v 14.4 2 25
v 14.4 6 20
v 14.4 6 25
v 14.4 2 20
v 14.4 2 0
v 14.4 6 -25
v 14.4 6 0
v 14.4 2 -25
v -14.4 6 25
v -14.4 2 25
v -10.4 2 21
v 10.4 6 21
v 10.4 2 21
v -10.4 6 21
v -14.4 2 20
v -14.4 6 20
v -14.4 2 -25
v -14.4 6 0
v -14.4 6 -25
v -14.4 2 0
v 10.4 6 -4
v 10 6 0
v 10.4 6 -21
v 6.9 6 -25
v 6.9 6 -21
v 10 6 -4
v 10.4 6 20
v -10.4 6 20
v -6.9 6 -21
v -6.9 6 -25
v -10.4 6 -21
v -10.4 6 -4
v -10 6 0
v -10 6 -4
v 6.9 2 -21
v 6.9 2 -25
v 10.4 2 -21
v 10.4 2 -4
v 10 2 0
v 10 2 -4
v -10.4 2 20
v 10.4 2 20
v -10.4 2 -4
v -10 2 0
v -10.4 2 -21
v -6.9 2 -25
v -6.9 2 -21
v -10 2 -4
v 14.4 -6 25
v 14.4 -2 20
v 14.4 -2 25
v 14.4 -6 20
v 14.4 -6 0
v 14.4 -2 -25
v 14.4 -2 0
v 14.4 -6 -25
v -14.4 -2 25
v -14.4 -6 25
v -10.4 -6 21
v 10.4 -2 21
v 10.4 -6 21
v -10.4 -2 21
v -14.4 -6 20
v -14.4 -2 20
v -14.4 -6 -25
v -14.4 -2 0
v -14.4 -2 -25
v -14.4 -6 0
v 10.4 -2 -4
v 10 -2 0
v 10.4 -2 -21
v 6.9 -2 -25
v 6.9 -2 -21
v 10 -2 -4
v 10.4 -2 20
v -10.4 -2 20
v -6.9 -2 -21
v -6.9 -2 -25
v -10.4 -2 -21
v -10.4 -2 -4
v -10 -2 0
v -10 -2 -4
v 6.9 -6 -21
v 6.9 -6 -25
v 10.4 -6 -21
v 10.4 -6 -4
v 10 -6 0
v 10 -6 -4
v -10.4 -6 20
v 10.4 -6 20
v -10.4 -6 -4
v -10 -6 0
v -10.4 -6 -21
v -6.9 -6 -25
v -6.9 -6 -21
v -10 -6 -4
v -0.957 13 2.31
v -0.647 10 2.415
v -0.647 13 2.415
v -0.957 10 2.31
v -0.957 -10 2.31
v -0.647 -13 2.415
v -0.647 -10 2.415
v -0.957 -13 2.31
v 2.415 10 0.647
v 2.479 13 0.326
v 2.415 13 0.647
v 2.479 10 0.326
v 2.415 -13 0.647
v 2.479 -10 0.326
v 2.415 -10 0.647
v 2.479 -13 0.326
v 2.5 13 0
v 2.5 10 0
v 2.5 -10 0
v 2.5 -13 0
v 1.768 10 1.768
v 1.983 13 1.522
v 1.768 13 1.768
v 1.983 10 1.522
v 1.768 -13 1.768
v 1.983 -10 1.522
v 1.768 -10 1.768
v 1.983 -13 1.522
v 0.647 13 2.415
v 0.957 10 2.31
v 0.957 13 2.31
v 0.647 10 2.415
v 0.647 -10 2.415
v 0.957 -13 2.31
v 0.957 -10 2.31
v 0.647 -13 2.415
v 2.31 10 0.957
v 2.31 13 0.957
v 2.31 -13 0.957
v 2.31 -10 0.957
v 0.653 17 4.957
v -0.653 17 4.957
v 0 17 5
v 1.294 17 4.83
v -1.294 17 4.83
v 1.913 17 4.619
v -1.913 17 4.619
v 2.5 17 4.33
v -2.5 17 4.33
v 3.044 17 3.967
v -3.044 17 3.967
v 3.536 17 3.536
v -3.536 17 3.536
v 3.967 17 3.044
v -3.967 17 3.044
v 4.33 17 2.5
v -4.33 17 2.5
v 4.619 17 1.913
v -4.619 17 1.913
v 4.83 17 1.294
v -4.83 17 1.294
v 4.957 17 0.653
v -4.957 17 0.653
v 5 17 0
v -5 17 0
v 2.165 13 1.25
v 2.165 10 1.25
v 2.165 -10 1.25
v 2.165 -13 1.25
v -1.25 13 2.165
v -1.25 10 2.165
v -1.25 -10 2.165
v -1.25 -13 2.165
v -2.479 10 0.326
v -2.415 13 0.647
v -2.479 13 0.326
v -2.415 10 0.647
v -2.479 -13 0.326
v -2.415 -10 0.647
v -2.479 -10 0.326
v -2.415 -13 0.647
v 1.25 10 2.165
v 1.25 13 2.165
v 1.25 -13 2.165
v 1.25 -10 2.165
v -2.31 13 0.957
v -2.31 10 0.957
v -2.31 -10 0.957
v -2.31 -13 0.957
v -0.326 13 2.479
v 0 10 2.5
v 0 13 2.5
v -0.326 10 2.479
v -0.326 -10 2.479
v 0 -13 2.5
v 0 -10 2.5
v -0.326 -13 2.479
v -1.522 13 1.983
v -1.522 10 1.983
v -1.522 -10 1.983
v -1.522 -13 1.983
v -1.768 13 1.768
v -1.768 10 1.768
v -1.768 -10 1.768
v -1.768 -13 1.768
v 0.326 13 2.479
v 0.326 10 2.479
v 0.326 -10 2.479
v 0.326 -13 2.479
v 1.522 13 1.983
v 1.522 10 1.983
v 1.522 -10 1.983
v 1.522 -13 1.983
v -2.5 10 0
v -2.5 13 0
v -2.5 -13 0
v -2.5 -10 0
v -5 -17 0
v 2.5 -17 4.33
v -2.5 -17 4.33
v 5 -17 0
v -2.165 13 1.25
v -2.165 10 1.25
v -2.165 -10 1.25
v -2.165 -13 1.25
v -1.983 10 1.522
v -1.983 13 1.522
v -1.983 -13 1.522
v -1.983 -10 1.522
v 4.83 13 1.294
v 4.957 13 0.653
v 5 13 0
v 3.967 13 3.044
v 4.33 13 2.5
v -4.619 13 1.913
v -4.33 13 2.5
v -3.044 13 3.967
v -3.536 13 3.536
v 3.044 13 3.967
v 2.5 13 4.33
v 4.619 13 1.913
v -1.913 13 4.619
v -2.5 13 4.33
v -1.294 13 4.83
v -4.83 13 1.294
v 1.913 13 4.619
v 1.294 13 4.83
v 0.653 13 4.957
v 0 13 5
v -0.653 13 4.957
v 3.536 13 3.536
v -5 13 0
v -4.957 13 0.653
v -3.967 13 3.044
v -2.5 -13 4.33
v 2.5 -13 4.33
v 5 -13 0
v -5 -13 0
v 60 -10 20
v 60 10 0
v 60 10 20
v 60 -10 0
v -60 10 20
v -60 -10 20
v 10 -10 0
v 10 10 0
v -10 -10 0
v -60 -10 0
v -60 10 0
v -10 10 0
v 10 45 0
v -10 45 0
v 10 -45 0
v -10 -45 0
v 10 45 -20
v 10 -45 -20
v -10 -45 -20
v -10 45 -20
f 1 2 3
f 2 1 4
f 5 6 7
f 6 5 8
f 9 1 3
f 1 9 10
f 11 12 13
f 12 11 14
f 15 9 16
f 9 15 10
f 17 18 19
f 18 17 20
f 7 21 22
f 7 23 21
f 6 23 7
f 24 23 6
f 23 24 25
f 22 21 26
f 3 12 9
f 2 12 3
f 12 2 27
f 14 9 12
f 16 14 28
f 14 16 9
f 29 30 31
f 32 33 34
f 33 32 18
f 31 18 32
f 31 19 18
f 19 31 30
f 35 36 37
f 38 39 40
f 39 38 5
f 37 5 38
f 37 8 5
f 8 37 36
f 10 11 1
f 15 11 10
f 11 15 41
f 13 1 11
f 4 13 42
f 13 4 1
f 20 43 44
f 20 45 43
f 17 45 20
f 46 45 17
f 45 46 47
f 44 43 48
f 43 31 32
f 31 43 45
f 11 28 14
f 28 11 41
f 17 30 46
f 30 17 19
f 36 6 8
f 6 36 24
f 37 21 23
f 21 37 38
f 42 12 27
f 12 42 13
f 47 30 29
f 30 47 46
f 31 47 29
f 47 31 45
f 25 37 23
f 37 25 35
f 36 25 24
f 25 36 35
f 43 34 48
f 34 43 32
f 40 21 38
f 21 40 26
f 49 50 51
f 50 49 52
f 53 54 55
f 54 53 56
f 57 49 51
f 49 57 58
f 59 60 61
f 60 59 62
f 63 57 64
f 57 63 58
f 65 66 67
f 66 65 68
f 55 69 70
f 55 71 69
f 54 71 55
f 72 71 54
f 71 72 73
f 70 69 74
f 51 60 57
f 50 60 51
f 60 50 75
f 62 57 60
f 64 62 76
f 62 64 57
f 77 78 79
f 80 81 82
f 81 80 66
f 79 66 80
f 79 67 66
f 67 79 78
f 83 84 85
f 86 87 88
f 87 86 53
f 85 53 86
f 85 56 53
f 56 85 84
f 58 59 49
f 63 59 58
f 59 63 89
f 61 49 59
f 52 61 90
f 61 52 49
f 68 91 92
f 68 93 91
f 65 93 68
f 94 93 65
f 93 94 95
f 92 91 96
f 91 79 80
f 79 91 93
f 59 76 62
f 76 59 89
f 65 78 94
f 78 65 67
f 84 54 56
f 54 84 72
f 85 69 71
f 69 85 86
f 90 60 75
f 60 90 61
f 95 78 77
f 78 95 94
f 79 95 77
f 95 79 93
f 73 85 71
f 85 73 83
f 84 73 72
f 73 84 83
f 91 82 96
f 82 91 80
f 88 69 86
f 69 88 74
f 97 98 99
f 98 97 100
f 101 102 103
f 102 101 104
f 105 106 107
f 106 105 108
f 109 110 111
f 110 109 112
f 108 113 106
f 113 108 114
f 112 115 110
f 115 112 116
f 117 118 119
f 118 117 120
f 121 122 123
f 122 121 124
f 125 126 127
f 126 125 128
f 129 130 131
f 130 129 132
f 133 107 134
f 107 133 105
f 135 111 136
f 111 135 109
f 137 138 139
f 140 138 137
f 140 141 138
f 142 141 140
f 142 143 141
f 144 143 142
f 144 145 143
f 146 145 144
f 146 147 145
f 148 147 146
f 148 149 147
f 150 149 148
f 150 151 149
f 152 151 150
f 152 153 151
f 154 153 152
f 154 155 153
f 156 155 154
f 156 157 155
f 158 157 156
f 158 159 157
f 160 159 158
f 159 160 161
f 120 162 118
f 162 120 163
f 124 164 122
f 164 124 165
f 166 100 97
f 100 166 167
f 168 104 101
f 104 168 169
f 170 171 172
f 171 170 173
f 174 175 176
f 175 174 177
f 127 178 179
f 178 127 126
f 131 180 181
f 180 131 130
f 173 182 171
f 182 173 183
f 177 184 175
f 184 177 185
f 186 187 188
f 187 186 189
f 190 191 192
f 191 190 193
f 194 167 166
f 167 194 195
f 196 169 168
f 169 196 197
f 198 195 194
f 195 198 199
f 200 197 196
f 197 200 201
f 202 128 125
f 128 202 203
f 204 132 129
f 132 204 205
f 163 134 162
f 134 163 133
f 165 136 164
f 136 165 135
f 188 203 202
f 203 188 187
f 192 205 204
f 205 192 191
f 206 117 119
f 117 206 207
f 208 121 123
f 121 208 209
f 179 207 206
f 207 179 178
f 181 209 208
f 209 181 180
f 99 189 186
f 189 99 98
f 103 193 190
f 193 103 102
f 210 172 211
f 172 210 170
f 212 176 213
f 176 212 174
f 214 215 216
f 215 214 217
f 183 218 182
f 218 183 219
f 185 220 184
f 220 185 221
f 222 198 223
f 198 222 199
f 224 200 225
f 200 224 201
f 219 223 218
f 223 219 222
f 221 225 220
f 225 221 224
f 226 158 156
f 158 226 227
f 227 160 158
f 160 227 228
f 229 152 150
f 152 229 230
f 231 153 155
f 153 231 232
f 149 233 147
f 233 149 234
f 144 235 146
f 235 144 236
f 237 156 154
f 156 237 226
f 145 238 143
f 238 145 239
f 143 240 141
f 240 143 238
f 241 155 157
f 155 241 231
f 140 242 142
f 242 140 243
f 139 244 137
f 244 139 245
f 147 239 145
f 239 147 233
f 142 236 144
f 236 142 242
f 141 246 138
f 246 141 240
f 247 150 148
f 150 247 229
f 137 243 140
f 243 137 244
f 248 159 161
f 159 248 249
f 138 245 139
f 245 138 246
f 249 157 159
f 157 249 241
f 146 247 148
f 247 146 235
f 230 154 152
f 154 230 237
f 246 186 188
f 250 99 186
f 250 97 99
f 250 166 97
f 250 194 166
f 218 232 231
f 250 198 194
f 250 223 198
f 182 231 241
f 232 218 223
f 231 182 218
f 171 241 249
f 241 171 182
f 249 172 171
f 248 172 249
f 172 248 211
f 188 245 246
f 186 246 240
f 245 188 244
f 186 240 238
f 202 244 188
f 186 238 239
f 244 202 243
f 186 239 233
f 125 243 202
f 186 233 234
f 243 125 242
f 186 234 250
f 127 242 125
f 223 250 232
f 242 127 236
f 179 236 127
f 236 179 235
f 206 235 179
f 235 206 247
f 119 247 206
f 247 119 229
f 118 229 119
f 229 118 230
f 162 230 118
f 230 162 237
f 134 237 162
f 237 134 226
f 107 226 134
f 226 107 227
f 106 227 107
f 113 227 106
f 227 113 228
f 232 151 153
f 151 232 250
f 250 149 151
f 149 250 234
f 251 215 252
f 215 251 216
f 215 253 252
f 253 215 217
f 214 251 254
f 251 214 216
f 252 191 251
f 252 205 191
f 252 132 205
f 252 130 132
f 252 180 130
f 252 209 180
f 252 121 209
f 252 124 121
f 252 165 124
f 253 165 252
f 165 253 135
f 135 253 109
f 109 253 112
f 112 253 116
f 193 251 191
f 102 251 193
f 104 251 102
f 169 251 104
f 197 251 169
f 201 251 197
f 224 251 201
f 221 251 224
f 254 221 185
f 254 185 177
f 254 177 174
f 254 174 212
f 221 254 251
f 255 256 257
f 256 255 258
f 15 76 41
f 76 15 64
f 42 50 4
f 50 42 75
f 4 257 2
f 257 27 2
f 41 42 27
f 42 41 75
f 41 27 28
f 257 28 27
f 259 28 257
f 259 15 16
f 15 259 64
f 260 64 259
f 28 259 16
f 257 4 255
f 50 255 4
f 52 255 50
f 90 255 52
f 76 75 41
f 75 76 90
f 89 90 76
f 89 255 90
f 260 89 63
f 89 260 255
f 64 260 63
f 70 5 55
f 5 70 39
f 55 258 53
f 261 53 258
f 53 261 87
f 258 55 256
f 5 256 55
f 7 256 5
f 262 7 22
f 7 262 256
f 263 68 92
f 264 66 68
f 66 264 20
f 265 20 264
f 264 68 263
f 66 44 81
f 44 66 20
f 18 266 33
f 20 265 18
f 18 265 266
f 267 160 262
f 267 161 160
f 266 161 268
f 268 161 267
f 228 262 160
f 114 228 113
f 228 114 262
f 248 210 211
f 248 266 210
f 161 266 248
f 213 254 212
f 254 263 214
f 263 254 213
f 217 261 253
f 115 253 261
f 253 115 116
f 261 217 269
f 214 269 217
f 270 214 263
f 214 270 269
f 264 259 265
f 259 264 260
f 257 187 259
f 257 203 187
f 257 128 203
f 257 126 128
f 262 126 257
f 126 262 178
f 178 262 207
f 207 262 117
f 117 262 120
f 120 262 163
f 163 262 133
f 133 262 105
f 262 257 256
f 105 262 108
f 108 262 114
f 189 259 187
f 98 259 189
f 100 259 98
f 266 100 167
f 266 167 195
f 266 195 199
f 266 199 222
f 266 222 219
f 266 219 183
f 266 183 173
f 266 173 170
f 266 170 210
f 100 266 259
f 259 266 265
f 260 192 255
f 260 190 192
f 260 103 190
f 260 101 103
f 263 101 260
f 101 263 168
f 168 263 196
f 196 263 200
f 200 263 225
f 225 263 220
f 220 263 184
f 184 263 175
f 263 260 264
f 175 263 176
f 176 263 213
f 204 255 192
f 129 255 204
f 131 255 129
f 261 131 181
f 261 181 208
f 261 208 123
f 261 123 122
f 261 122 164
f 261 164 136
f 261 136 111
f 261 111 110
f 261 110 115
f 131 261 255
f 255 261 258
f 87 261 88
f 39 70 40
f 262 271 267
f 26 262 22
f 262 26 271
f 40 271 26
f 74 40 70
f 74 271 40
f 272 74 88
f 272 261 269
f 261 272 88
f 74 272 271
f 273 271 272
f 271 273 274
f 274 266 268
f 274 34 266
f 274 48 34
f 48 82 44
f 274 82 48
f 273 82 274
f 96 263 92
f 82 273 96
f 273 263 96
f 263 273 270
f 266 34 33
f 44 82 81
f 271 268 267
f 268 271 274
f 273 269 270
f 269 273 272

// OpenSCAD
// Pingpang-SmartGear — perpendicular 20x20 tube joint guard, v0.2
//
// Coordinate contract for this prototype:
//   x = barrier long direction
//   y = front/back direction
//   z = vertical direction
//
// The two context tubes are 20x20 and touch at z=0:
//   upper long tube: axis x, centre z=+10
//   lower cross tube: axis y, centre z=-10
//
// The printable parts are two separate U clips.  Their main U bodies sit on
// opposite y faces.  A male annular lap on the front clip enters a female
// annular socket on the back clip; the common screw clearance is on the y
// axis.  This is intentionally parameterized because the actual tube hole
// centre and the real M4/M5 hardware have not yet been measured.

$fn = 48;

PART = "joint_assembly";

// ---------- interface parameters ----------
tube = 20;
tube_clearance = 0.8;
u_inner_width = tube + tube_clearance;
wall = 4.0;
u_outer_width = u_inner_width + 2 * wall;

// The U is open toward the bottom and has small inward lips to retain the
// lower tube after the clip is placed over the joint.
u_bottom = -25;
u_top = 25;
hook_depth = 3.5;

// Front/back face plates.  Positive y is the front face.
plate_depth = 4.0;
front_y0 = 2.0;
front_y1 = front_y0 + plate_depth;
back_y0 = -front_y1;
back_y1 = -front_y0;

// Central lap: front male ring enters the back female socket.
male_lap_depth = 5.0;
male_od = 14.4;
female_od = 20.0;
female_id = 15.2;

// Central screw relief.  This is a clearance hole, not a printed thread.
screw_clearance_d = 6.2;
screw_counterbore_d = 10.8;
screw_counterbore_depth = 2.2;

// The central web joins the collar to both U arms and leaves a clear hole
// in the middle of the two-clips connection.
web_height = 8.0;
web_depth = plate_depth;

// ---------- small geometry helpers ----------
module box_at(xc, yc, zc, sx, sy, sz) {
    translate([xc, yc, zc]) cube([sx, sy, sz], center = true);
}

module annular_y(yc, length, outer_d, inner_d) {
    translate([0, yc, 0])
        difference() {
            rotate([90, 0, 0]) cylinder(d = outer_d, h = length, center = true);
            rotate([90, 0, 0]) cylinder(d = inner_d, h = length + 0.4, center = true);
        }
}

module u_body(y0, y1) {
    depth = y1 - y0;
    yc = (y0 + y1) / 2;
    left_x = -u_outer_width / 2 + wall / 2;
    right_x = u_outer_width / 2 - wall / 2;
    lip_z = u_bottom + wall / 2;
    left_lip_x = -u_outer_width / 2 + wall + hook_depth / 2;
    right_lip_x = u_outer_width / 2 - wall - hook_depth / 2;

    union() {
        // Top bridge and two long arms form the U profile.
        box_at(0, yc, u_top - wall / 2, u_outer_width, depth, wall);
        box_at(left_x, yc, (u_top + u_bottom) / 2, wall, depth, u_top - u_bottom);
        box_at(right_x, yc, (u_top + u_bottom) / 2, wall, depth, u_top - u_bottom);

        // Inward lower lips catch the lower 20x20 tube.
        box_at(left_lip_x, yc, lip_z, hook_depth, depth, wall);
        box_at(right_lip_x, yc, lip_z, hook_depth, depth, wall);

        // A short face web carries the screw collar without filling the U.
        box_at(0, yc, 0, u_outer_width, web_depth, web_height);
    }
}

module central_hole(y0, y1, outer_y, outward_sign) {
    // Main through-clearance hole along y.
    translate([0, (y0 + y1) / 2, 0])
        rotate([90, 0, 0])
            cylinder(d = screw_clearance_d, h = (y1 - y0) + 12, center = true);

    // Head relief is only opened from the outward face.  It remains a simple
    // circular pocket so it can be changed to a real head/nut capture later.
    translate([0, outer_y - outward_sign * screw_counterbore_depth / 2, 0])
        rotate([90, 0, 0])
            cylinder(d = screw_counterbore_d,
                     h = screw_counterbore_depth + 0.2,
                     center = true);
}

module u_clip(front = true) {
    if (front) {
        // Front U body: y=+2..+6.  The male annular tongue projects inward.
        difference() {
            union() {
                u_body(front_y0, front_y1);
                annular_y(front_y0 - male_lap_depth / 2,
                          male_lap_depth,
                          male_od,
                          screw_clearance_d);
            }
            central_hole(front_y0, front_y1, front_y1, 1);
        }
    } else {
        // Back U body: y=-6..-2.  The female socket receives the male ring.
        socket_y0 = back_y1 - 0.4;
        socket_y1 = socket_y0 + male_lap_depth + 0.4;
        difference() {
            union() {
                u_body(back_y0, back_y1);
                annular_y((socket_y0 + socket_y1) / 2,
                          socket_y1 - socket_y0,
                          female_od,
                          female_id);
            }
            central_hole(back_y0, back_y1, back_y0, -1);
        }
    }
}

// ---------- context geometry ----------
module upper_long_tube() {
    color([0.58, 0.61, 0.66])
        translate([0, 0, tube / 2])
            cube([120, tube, tube], center = true);
}

module lower_cross_tube() {
    color([0.28, 0.45, 0.78])
        translate([0, 0, -tube / 2])
            cube([tube, 90, tube], center = true);
}

module joint_bolt() {
    color([0.82, 0.82, 0.84])
        translate([0, 0, 0])
            rotate([90, 0, 0])
                cylinder(d = 5.0, h = 34, center = true);

    color([0.92, 0.70, 0.12])
        translate([0, 15, 0])
            rotate([90, 0, 0])
                cylinder(d = 10.0, h = 4.0, center = true);

    color([0.92, 0.70, 0.12])
        translate([0, -15, 0])
            rotate([90, 0, 0])
                cylinder(d = 10.0, h = 4.0, center = true, $fn = 6);
}

module joint_assembly(show_bolt = true) {
    upper_long_tube();
    lower_cross_tube();

    color([0.97, 0.45, 0.10]) u_clip(true);
    color([0.08, 0.62, 0.63]) u_clip(false);

    if (show_bolt) joint_bolt();
}

module joint_exploded() {
    // Exploded only in y so the two U profiles and their central male/female
    // lap can be inspected without hiding the real assembled relation.
    upper_long_tube();
    lower_cross_tube();
    translate([0, 7, 0]) color([0.97, 0.45, 0.10]) u_clip(true);
    translate([0, -7, 0]) color([0.08, 0.62, 0.63]) u_clip(false);
    joint_bolt();
}

module joint_section() {
    // Right half section exposes the central web, screw relief, and lap ring.
    intersection() {
        joint_assembly(false);
        translate([0, -100, -100]) cube([100, 200, 200]);
    }
    joint_bolt();
}

module print_front() {
    // Put the U face on the bed: x/y footprint, y-depth becomes print height.
    translate([0, 0, 3]) rotate([90, 0, 0]) u_clip(true);
}

module print_back() {
    translate([0, 0, 6]) rotate([90, 0, 0]) u_clip(false);
}

module print_layout() {
    translate([-23, 0, 0]) print_front();
    translate([23, 0, 0]) print_back();
}

// ---------- part selector ----------
if (PART == "front_u") {
    u_clip(true);
} else if (PART == "back_u") {
    u_clip(false);
} else if (PART == "front_u_print") {
    print_front();
} else if (PART == "back_u_print") {
    print_back();
} else if (PART == "joint_exploded") {
    joint_exploded();
} else if (PART == "joint_section") {
    joint_section();
} else if (PART == "print_layout") {
    print_layout();
} else {
    joint_assembly();
}
